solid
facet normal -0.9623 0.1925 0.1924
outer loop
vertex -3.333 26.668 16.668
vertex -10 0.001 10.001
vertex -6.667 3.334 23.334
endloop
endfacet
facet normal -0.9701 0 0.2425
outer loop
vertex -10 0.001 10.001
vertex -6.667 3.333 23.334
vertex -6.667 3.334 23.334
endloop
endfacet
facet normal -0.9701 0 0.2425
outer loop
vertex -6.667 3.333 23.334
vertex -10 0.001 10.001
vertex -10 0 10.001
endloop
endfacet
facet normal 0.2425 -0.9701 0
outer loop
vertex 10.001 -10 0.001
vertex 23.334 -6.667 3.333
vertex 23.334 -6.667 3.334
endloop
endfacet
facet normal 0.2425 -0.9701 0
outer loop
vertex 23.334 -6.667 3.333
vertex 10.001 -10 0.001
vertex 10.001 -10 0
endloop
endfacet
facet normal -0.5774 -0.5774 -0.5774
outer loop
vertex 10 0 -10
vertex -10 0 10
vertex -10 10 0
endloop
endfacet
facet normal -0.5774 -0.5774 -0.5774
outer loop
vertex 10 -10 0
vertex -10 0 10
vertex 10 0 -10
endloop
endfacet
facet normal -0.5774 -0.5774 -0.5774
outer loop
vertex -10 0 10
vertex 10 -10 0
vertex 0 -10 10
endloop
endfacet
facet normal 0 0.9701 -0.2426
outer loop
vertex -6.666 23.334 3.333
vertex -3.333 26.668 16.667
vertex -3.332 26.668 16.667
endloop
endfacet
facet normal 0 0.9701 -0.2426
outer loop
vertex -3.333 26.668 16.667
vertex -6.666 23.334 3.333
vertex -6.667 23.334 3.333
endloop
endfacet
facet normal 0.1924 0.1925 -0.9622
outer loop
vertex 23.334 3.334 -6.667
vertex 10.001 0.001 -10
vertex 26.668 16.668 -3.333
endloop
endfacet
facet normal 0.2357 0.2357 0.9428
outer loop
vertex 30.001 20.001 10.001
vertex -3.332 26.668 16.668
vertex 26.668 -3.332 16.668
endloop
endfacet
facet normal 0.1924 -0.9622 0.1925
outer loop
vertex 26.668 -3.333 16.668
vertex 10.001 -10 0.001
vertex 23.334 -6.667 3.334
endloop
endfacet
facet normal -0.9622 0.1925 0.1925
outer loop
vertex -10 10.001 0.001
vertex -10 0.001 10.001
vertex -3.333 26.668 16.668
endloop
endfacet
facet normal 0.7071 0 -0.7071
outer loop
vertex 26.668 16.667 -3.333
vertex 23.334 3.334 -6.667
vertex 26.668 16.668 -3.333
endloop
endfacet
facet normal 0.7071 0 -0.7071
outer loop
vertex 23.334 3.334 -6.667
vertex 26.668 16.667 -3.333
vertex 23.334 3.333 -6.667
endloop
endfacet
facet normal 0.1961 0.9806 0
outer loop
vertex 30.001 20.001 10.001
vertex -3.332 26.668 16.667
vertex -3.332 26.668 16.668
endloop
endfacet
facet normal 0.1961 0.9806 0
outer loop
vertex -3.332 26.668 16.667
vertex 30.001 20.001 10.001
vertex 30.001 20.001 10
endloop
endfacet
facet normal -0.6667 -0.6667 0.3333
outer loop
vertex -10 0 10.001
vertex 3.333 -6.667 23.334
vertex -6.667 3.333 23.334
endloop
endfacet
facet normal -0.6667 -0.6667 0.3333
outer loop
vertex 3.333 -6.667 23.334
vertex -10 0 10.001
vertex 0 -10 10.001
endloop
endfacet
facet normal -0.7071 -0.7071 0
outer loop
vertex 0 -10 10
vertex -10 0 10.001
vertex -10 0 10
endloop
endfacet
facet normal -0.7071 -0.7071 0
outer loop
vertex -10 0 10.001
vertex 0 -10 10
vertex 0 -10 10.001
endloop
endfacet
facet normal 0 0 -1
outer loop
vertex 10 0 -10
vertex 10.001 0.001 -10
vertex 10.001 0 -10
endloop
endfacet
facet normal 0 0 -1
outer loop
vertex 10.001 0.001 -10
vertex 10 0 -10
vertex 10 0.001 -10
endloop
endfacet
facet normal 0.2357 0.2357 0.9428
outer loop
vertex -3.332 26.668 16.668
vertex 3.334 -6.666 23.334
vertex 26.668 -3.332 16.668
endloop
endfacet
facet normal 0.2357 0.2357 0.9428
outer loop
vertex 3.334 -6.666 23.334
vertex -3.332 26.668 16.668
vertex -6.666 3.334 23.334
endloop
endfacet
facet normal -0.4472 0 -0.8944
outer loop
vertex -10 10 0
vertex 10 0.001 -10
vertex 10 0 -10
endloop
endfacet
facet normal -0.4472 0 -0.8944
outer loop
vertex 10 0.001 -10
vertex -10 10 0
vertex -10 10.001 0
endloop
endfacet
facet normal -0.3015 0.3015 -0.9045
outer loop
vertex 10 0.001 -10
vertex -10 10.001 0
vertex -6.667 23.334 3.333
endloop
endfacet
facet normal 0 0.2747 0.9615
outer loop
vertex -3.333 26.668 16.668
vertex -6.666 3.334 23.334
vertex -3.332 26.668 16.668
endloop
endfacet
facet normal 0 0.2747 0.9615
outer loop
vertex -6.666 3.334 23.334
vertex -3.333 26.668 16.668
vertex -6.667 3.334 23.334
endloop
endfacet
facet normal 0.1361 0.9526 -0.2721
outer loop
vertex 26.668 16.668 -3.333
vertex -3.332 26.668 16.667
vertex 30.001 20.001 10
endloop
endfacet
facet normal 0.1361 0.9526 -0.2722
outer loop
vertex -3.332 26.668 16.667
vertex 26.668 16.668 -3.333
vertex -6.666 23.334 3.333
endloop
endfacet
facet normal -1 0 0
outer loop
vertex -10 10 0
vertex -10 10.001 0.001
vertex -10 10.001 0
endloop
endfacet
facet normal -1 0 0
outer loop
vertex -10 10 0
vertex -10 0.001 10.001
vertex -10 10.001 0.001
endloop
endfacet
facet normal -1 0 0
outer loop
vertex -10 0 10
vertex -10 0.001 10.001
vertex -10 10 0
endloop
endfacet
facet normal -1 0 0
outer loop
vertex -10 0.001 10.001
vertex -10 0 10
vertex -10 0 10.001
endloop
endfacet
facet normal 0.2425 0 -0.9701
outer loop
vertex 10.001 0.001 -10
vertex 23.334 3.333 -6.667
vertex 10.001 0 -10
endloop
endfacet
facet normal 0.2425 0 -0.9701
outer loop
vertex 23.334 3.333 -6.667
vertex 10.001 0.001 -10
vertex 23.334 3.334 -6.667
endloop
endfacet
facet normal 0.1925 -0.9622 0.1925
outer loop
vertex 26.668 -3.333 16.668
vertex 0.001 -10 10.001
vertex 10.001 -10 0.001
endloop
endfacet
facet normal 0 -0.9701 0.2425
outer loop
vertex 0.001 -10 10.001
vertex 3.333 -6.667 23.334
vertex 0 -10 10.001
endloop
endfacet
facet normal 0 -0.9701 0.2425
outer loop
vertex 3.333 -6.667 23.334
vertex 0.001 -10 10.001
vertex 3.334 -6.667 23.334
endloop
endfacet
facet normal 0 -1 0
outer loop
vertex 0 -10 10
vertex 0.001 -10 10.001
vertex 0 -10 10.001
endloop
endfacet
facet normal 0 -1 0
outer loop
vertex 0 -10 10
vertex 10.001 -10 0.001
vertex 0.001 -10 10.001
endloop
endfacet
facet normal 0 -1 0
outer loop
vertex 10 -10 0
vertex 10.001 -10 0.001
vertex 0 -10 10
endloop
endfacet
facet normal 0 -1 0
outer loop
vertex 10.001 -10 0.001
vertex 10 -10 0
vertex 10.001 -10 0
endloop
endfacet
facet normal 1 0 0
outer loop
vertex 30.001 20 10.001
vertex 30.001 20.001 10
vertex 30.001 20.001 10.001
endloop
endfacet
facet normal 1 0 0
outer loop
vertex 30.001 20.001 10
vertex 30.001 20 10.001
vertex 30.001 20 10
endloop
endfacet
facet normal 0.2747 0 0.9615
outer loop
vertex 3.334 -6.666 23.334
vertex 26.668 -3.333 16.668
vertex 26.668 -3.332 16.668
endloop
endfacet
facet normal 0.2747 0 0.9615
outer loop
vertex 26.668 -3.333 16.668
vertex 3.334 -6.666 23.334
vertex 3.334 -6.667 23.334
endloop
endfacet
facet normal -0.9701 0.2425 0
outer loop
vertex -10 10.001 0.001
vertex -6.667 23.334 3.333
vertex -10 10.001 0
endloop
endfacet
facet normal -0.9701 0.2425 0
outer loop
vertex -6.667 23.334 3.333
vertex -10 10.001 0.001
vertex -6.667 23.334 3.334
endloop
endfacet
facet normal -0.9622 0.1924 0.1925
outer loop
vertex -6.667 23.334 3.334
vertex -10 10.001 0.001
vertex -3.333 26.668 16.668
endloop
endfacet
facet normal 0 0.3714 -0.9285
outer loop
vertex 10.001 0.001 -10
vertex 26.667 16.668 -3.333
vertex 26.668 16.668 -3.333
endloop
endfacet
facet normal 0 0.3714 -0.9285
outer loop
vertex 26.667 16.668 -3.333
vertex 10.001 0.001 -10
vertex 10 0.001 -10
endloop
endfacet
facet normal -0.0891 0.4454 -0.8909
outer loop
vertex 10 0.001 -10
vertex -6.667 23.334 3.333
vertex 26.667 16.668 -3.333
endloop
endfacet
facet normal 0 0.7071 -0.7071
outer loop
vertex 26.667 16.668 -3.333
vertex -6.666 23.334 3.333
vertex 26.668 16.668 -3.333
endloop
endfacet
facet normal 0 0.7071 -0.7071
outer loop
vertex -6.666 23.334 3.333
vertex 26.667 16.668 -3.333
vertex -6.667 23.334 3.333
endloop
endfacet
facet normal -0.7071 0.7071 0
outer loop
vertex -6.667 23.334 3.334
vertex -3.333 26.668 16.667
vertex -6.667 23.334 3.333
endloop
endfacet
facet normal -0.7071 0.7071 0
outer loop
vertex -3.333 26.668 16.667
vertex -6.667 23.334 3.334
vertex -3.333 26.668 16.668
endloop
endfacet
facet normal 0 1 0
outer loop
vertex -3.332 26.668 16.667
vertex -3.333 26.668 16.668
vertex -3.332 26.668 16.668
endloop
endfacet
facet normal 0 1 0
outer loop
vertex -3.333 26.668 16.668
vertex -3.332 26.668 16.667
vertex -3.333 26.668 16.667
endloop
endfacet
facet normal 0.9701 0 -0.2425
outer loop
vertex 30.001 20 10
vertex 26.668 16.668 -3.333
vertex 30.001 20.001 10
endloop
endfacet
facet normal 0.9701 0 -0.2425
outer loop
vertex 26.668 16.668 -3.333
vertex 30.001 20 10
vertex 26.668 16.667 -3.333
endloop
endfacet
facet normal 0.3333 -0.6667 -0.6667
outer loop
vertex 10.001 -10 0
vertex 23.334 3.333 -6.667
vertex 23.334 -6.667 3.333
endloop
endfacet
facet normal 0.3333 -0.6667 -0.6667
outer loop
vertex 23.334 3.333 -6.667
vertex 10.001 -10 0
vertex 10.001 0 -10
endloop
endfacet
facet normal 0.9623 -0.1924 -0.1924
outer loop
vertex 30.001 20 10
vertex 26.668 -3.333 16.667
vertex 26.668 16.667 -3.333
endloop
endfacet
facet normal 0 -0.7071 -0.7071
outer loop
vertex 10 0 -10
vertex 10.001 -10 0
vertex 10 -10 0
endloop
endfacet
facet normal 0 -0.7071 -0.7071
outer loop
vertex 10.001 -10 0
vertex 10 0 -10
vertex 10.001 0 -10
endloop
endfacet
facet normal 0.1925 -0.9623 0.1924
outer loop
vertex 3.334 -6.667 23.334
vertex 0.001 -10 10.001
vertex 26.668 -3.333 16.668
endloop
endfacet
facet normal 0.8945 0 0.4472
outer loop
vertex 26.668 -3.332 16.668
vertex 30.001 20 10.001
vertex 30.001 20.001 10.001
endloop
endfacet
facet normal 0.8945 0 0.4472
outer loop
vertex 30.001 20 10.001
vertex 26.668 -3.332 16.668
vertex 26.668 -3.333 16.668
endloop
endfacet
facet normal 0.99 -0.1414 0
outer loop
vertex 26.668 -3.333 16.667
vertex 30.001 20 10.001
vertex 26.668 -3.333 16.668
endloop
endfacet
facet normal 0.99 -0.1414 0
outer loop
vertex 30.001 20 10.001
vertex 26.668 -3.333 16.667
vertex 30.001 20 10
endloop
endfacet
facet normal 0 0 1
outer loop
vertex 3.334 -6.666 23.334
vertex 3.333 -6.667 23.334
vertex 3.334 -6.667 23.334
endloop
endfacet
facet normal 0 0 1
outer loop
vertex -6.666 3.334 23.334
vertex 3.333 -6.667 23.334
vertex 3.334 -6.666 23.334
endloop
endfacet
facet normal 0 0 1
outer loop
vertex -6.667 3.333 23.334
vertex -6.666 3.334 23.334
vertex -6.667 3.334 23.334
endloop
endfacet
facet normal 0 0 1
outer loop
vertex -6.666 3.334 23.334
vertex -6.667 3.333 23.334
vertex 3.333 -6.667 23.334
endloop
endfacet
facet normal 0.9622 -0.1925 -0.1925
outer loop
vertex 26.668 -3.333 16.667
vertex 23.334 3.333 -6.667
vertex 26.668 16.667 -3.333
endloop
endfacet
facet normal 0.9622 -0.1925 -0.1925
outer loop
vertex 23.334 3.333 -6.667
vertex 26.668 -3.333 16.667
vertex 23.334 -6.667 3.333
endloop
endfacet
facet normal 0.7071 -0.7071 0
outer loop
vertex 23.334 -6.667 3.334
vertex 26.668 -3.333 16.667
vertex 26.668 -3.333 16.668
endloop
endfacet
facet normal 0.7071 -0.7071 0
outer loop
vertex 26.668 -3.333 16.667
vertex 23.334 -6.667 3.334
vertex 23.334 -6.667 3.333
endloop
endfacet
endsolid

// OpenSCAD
module convex_poly(l) {
     hull() { for (point=l) translate (point) cube(0.0001); }
};

// compute the sum of a list of vectors
function sum_vects(l) = (len(l) == 0) ? [0,0,0] :
     sum_vects([for (i = [0:1:len(l)-2]) l[i]]) + l[len(l)-1];

// Todo : generate with a rec module
perm4 = [[0,1,2,3],[0,1,3,2],[0,2,1,3],[0,2,3,1],[0,3,1,2],[0,3,2,1],
	 [1,0,2,3],[1,0,3,2],[1,2,0,3],[1,2,3,0],[1,3,0,2],[1,3,2,0],
	 [2,0,1,3],[2,0,3,1],[2,1,0,3],[2,1,3,0],[2,3,0,1],[2,3,1,0],
	 [3,0,1,2],[3,0,2,1],[3,1,0,2],[3,1,2,0],[3,2,0,1],[3,2,1,0]];

ass4 =  [[0,1,2,3],[0,1,3,2],[0,2,1,3],         ,[0,3,1,2],[0,3,2,1],
	 [1,0,2,3],[1,0,3,2],         ,         ,         ,         ,
	 [2,0,1,3],         ,[2,1,0,3],         ,         ,         ,
	 [3,0,1,2],[3,0,2,1],[3,1,0,2],         ,[3,2,0,1],[3,2,1,0]];

cube4 = [[0,1,2,3],[0,1,3,2],         ,         ,[0,3,1,2],[0,3,2,1],
	          ,         ,         ,         ,         ,         ,
	          ,         ,         ,         ,         ,         ,
	 [3,0,1,2],[3,0,2,1],         ,         ,[3,2,0,1],[3,2,1,0]];

// projection matrix 4D -> 3D
projmatrix = [[1, 0, 0], [0, 1, 0], [0, 0, 1], [-1/3, -1/3, -1/3]];

// scale(10) convex_poly([for (p=perm4) p * projmatrix]);
scale(10) convex_poly([for (p=ass4) p * projmatrix]);
scale(10) convex_poly([for (p=cube4) p * projmatrix]);
